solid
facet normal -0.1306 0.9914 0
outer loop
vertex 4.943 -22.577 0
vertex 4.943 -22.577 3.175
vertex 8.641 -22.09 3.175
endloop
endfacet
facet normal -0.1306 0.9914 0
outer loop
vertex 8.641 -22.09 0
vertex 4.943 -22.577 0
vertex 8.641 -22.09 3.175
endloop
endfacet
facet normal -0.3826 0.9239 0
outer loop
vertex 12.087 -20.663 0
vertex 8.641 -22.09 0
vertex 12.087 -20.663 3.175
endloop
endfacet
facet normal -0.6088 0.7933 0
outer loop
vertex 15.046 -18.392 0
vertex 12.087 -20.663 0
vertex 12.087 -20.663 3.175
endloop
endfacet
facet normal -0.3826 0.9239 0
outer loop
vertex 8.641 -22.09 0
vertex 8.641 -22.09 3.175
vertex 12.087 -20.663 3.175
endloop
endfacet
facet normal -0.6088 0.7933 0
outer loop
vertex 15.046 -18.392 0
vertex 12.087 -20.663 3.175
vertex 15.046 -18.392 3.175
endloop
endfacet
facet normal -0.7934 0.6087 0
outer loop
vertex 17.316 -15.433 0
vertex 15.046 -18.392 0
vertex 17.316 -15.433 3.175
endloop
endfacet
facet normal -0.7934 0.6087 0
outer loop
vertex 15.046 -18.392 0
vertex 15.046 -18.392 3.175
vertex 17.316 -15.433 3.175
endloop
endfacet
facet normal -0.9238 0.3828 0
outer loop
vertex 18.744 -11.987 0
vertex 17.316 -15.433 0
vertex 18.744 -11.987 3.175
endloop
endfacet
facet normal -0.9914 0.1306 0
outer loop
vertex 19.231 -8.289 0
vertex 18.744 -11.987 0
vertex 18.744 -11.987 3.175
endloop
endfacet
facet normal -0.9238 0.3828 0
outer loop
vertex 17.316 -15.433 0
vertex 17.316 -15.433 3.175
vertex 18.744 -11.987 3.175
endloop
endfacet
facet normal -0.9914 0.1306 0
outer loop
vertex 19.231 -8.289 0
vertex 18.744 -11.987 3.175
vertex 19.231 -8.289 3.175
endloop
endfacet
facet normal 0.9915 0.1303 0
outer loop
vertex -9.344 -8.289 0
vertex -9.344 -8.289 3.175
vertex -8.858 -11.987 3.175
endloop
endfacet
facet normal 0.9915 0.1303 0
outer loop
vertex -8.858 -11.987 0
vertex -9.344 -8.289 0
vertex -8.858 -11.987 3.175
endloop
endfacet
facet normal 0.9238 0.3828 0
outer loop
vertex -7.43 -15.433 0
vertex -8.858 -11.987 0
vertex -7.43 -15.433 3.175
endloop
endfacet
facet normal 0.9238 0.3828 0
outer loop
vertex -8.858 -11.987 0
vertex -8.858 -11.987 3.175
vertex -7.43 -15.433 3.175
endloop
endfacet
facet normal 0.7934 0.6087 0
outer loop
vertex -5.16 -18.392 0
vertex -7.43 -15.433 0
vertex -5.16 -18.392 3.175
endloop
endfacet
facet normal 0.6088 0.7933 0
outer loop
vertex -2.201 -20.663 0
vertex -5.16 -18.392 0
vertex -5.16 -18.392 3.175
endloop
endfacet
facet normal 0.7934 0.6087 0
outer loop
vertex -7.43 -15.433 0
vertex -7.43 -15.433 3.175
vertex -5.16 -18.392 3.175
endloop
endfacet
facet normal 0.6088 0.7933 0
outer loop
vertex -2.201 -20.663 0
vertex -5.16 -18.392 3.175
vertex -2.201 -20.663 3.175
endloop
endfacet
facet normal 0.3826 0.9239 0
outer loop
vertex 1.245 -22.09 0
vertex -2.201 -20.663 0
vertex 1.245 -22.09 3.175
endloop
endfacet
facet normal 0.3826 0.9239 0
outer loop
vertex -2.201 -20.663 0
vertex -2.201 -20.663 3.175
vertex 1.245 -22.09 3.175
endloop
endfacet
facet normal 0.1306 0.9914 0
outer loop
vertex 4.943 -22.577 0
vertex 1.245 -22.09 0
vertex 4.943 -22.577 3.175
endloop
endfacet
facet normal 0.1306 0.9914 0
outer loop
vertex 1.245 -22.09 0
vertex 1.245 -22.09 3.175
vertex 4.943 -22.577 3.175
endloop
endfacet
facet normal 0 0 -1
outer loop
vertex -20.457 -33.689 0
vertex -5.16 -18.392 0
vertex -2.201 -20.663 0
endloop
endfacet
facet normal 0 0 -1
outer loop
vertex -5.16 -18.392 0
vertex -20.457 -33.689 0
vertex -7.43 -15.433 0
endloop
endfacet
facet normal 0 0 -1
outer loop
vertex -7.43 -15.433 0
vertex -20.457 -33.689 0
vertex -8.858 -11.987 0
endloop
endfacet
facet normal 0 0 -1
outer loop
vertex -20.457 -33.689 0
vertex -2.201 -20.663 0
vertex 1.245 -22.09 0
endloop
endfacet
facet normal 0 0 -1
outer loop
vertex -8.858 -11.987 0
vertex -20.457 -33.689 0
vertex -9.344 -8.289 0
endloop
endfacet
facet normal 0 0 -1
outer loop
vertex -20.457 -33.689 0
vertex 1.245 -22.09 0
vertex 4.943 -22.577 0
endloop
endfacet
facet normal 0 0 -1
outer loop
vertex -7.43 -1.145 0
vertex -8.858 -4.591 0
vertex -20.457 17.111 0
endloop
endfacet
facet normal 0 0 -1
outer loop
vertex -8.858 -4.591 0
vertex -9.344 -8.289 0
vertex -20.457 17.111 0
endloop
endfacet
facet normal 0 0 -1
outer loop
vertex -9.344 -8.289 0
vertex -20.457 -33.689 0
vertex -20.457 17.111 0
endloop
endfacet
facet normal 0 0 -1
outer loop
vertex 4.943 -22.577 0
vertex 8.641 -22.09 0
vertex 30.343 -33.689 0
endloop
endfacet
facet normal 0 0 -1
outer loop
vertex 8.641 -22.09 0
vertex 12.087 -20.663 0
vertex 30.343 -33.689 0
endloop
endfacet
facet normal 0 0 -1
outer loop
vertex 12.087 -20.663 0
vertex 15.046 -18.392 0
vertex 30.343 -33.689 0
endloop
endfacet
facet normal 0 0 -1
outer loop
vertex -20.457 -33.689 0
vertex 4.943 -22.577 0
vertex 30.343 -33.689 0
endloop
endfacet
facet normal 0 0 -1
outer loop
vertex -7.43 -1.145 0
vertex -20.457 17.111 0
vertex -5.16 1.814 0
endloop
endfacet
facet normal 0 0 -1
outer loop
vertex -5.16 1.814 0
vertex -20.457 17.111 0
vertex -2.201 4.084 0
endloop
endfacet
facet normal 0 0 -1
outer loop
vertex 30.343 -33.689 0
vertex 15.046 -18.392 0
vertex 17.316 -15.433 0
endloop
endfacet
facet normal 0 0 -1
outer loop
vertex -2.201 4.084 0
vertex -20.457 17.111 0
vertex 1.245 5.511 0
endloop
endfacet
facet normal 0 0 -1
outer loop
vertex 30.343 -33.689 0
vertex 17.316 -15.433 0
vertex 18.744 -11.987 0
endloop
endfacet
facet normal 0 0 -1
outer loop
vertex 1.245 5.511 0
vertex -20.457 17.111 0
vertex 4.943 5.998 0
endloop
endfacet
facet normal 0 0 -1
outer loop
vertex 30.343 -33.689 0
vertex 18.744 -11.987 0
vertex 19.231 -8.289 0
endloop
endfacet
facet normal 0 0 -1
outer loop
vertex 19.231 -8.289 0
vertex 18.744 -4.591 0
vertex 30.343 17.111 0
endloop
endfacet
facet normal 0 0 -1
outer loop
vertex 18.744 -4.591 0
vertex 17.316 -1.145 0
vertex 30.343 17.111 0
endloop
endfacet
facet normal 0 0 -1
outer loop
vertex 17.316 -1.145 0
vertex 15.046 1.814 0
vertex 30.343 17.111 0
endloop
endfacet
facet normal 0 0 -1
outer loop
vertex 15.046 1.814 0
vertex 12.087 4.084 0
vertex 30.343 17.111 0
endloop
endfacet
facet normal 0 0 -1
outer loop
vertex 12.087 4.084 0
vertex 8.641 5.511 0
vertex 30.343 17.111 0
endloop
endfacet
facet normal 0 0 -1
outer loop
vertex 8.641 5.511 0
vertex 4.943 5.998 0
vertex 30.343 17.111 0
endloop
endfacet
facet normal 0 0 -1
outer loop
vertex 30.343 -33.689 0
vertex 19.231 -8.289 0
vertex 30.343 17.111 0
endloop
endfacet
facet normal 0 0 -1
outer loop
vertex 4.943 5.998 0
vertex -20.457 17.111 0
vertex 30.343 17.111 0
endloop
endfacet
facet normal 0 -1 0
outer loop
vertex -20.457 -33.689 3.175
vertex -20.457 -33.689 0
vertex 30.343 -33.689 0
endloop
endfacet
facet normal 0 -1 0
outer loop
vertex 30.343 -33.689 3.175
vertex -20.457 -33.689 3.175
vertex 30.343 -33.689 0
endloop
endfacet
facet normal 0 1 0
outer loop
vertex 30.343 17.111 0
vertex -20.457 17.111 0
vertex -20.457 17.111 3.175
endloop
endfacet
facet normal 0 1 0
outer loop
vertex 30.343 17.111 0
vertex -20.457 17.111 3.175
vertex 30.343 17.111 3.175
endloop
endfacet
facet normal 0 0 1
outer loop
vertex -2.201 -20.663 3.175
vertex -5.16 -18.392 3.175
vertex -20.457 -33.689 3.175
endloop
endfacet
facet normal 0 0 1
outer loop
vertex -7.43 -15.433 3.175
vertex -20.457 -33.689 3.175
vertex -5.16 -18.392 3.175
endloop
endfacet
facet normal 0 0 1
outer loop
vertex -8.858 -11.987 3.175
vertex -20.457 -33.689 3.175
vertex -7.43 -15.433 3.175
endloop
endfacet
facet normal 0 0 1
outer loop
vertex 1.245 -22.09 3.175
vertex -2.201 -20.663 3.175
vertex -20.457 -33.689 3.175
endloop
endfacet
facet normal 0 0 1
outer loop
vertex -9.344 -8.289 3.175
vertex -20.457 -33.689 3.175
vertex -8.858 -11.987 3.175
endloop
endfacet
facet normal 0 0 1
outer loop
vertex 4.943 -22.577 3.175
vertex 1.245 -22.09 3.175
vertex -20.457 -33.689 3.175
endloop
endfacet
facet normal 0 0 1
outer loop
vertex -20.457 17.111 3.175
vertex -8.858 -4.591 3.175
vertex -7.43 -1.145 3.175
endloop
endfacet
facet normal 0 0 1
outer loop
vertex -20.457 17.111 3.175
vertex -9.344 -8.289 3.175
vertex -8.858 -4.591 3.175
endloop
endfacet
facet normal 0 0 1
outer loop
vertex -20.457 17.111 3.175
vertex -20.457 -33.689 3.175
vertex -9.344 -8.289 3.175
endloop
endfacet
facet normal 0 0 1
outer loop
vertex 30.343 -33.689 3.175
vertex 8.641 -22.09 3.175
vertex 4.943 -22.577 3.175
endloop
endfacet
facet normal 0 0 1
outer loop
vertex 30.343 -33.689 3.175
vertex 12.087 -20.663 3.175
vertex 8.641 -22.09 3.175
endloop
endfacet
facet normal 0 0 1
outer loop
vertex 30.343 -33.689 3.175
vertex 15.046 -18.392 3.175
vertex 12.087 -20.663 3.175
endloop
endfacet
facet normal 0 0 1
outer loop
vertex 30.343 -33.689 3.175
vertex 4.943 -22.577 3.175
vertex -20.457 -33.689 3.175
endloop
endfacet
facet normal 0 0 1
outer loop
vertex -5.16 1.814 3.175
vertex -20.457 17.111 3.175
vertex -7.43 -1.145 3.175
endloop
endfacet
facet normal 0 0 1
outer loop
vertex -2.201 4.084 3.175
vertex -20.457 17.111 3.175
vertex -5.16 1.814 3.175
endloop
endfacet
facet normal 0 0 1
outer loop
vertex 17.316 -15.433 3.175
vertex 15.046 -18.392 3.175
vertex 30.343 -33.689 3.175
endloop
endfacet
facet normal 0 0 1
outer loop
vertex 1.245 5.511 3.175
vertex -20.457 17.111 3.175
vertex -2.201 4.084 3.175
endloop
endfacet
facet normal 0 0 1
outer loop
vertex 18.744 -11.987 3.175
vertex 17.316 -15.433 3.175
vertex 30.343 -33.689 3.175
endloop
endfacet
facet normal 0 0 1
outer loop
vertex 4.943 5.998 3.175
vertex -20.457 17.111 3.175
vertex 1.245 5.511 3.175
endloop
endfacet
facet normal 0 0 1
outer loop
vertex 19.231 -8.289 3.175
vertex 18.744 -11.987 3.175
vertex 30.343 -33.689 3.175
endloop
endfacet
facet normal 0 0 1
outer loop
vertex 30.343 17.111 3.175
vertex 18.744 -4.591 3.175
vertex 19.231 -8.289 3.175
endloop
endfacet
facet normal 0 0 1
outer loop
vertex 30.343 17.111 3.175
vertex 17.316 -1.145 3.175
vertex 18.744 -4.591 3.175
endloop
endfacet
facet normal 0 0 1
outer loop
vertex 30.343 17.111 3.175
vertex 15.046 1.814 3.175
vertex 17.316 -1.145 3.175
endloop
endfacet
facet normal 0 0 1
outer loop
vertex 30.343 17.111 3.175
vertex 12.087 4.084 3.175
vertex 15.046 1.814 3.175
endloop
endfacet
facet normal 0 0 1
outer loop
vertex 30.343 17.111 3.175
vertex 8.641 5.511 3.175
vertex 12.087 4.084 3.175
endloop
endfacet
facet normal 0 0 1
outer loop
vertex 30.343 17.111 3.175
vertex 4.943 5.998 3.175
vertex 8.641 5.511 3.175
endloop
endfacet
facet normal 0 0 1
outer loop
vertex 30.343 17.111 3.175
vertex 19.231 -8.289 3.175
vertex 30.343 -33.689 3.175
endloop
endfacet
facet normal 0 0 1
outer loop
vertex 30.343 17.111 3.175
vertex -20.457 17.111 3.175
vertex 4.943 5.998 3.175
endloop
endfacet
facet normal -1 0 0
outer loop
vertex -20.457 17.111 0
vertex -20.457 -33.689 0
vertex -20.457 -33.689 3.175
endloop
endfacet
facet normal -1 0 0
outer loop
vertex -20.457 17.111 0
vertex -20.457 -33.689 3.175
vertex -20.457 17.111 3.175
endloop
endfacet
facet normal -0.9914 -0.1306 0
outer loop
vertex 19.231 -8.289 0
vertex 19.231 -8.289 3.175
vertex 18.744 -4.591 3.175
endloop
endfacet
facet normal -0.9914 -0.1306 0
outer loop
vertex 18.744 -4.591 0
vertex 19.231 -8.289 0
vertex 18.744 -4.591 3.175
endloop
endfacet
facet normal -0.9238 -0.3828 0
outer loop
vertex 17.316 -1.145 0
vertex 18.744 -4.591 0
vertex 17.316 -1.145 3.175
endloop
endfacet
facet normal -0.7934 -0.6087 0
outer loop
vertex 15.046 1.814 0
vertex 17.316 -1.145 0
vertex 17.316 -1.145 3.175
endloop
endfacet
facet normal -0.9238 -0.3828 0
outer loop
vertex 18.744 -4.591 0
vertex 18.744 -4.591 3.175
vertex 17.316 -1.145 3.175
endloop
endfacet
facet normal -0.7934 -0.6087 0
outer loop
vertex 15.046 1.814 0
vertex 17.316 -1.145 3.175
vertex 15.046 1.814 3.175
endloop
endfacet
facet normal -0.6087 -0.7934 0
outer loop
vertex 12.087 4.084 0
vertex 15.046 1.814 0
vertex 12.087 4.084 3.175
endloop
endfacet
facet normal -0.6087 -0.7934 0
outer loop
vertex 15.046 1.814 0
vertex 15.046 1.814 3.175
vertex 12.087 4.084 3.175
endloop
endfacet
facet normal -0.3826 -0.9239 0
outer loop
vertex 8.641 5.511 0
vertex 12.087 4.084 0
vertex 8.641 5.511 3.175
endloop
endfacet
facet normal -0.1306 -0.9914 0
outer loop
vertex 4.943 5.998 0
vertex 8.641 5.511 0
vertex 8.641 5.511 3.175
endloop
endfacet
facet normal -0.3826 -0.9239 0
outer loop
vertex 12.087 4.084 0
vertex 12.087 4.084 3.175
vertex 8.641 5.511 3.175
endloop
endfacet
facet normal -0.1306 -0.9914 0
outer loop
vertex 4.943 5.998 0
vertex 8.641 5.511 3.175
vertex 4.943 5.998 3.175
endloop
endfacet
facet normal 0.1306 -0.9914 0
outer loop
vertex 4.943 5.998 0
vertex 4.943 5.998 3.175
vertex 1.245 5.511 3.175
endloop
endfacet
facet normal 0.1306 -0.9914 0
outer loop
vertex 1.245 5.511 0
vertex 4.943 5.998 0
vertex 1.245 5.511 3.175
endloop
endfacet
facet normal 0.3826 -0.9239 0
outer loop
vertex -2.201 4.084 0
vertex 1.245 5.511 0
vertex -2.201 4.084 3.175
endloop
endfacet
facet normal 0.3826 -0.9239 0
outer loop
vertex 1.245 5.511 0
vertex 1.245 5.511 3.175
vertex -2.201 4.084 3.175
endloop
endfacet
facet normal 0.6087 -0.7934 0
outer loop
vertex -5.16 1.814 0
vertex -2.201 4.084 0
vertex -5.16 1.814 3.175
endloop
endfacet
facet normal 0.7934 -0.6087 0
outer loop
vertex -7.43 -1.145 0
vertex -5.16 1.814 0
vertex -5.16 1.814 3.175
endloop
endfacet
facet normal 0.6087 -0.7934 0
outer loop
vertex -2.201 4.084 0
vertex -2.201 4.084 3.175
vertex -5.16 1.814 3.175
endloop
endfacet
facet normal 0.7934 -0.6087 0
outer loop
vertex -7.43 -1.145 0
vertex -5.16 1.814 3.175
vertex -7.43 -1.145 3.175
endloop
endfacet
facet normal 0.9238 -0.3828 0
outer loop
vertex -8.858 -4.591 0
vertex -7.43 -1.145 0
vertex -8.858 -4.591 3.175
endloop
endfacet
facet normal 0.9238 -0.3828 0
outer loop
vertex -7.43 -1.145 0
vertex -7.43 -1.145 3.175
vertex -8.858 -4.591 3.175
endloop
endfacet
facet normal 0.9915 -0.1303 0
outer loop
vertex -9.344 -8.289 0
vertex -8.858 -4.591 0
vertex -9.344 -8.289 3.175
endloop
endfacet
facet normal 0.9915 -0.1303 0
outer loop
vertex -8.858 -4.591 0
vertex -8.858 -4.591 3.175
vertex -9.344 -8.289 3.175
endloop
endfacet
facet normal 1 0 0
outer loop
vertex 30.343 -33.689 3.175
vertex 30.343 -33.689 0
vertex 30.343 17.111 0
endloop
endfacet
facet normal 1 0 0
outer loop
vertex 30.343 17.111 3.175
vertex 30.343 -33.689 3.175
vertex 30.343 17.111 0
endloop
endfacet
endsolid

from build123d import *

# Parameters (mm, degrees)
SKETCH1_W           = 50.8
SKETCH1_H           = 50.8
BOSS_EXTRUDE1_DEPTH = 3.175
CUT_EXTRUDE1_DEPTH  = 3.175


with BuildPart() as part:
    # Sketch1 → Boss-Extrude1 (new body)
    with BuildSketch(Plane.XY):
        with Locations((4.943113772, -8.289221557)):
            Rectangle(SKETCH1_W, SKETCH1_H)
    extrude(amount=BOSS_EXTRUDE1_DEPTH)

    # Sketch2 → Cut-Extrude1 (cut)
    with BuildSketch(Plane.XY.offset(3.175)):
        with BuildLine():
            ThreePointArc((19.230613772, -8.289221557), (15.045901909, 1.813566579), (4.943113772, 5.998278443))
            Line((4.943113772, 5.998278443), (4.943113772, -8.289221557))
            Line((4.943113772, -8.289221557), (19.230613772, -8.289221557))
        make_face()
        with BuildLine():
            Line((4.943113772, -8.289221557), (4.943113772, 5.998278443))
            ThreePointArc((4.943113772, 5.998278443), (-5.159674364, 1.813566579), (-9.344386228, -8.289221557))
            Line((-9.344386228, -8.289221557), (4.943113772, -8.289221557))
        make_face()
        with BuildLine():
            Line((19.230613772, -8.289221557), (4.943113772, -8.289221557))
            Line((4.943113772, -8.289221557), (4.943113772, -22.576721557))
            ThreePointArc((4.943113772, -22.576721557), (15.045901909, -18.392009693), (19.230613772, -8.289221557))
        make_face()
        with BuildLine():
            Line((4.943113772, -22.576721557), (4.943113772, -8.289221557))
            Line((4.943113772, -8.289221557), (-9.344386228, -8.289221557))
            ThreePointArc((-9.344386228, -8.289221557), (-5.159674364, -18.392009693), (4.943113772, -22.576721557))
        make_face()
    extrude(amount=-CUT_EXTRUDE1_DEPTH, mode=Mode.SUBTRACT)


solid = part.part
